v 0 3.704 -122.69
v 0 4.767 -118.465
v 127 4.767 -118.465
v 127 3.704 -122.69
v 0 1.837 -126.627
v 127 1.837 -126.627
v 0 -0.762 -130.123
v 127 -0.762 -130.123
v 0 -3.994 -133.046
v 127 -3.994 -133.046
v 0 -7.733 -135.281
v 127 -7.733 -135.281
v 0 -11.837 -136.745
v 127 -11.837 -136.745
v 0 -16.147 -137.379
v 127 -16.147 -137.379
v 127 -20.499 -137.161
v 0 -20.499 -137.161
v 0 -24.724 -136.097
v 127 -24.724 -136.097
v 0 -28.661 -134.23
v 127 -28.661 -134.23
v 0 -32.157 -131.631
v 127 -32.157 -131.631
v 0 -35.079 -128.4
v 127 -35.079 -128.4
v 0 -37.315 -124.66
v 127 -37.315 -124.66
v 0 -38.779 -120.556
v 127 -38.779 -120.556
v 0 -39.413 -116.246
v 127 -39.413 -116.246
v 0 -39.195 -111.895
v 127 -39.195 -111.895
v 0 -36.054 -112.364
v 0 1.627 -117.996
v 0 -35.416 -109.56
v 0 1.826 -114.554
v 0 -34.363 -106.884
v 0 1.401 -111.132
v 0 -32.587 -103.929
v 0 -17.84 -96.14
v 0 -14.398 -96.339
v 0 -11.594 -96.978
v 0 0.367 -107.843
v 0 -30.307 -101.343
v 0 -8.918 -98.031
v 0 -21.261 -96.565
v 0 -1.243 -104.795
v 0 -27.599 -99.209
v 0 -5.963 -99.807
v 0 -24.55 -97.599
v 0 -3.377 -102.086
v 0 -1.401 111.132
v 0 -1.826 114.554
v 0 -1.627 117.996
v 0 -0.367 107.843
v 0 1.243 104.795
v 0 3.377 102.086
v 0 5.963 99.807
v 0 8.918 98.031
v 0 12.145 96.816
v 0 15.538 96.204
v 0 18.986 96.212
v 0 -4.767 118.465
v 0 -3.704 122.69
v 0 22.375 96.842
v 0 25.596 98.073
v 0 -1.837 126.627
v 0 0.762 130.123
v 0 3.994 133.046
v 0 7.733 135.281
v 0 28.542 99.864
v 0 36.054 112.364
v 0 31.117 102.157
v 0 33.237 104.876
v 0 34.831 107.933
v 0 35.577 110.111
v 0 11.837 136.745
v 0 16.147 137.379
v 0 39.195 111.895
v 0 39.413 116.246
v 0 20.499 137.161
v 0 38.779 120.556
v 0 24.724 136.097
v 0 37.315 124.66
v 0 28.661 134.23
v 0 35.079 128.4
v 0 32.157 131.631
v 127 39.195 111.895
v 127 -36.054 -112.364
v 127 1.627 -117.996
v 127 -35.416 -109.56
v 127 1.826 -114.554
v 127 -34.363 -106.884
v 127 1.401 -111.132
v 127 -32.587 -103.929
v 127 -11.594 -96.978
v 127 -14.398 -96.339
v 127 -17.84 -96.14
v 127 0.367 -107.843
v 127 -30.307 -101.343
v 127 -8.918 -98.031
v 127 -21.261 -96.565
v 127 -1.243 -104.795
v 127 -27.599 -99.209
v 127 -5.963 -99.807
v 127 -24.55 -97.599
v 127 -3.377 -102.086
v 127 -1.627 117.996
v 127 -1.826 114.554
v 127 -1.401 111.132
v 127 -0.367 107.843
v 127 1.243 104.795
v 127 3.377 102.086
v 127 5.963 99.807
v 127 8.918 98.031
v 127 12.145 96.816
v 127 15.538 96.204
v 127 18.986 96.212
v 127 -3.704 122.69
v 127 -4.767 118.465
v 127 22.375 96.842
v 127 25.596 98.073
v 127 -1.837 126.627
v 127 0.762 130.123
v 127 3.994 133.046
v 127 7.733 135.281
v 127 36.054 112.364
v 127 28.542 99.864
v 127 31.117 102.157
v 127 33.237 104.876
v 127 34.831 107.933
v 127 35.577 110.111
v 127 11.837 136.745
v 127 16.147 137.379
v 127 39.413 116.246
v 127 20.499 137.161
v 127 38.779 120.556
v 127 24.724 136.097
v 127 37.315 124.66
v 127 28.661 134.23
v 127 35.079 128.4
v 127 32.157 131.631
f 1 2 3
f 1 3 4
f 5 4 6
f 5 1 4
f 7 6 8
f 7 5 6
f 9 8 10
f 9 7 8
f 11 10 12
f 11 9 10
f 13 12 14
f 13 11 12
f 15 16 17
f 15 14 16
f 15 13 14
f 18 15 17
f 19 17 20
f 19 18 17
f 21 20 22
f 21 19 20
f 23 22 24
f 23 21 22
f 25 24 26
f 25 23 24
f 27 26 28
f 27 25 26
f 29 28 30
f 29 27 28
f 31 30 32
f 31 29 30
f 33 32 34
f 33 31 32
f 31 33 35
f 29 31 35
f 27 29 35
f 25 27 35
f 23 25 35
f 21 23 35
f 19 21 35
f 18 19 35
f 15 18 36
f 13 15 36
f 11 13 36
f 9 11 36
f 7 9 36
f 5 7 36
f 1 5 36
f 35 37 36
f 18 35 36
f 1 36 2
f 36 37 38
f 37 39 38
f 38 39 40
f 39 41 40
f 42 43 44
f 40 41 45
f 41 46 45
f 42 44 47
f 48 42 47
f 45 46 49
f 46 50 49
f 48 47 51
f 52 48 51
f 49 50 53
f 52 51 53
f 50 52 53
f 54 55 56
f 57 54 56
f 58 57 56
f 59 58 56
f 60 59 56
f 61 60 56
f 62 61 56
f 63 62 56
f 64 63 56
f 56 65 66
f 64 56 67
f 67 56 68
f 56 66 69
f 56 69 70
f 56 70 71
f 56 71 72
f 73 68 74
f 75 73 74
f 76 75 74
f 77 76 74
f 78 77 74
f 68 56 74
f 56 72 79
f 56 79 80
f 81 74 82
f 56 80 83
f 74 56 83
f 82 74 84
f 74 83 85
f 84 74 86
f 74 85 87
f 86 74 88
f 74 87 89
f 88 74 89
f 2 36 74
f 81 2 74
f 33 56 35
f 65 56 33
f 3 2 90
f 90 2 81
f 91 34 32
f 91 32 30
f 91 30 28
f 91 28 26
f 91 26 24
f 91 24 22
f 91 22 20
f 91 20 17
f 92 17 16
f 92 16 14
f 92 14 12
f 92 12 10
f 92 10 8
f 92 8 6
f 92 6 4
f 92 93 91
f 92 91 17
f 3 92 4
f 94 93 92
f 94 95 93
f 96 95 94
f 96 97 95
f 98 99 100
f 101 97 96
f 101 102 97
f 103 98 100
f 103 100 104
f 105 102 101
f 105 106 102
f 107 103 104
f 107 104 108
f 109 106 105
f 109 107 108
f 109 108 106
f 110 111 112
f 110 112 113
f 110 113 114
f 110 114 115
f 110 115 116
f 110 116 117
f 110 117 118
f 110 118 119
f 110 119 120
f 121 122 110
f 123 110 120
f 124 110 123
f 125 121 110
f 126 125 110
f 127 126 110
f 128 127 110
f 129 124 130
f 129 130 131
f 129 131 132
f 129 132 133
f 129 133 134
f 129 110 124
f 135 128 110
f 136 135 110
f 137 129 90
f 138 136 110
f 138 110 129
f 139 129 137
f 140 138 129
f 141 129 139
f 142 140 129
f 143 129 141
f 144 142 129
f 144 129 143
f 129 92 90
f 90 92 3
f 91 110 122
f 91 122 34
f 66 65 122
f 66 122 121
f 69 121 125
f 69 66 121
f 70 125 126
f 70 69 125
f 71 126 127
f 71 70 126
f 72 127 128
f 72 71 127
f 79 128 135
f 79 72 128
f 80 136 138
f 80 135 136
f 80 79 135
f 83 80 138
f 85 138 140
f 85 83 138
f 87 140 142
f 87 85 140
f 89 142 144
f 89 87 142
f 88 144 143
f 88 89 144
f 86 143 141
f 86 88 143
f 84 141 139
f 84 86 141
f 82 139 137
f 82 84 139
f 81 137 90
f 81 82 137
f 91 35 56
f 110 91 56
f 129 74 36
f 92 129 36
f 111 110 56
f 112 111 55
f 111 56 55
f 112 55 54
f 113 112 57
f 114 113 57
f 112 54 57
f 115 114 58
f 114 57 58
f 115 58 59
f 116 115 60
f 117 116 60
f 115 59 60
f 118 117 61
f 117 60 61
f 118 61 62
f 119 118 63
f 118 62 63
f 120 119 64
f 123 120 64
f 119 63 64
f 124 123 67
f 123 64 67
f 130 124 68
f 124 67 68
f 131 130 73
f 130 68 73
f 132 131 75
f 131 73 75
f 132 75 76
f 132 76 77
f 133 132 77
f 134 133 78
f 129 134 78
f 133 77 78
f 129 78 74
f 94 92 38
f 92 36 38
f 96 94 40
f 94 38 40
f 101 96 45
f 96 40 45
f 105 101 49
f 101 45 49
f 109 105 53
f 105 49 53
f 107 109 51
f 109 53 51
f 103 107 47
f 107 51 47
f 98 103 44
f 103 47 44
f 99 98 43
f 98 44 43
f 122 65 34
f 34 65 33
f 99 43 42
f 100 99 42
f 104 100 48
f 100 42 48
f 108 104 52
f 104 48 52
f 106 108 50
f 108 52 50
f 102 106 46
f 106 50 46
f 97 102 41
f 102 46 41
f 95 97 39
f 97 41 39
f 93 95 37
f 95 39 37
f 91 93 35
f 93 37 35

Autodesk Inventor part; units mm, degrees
ref_plane "YZ Plane" through (0, 0, 0) normal (1, 0, 0) x (0, 1, 0)
ref_plane "XZ Plane" through (0, 0, 0) normal (0, 1, 0) x (-1, 0, 0)
ref_plane "XY Plane" through (0, 0, 0) normal (0, 0, 1) x (1, 0, 0)
sketch "Sketch3" plane through (0, 0, 0) normal (1, 0, 0) x (0, 1, 0)
  line L0 (17.2137, 115.1798) -> (-17.2137, -115.1798) construction
  line L1 (-4.7671, 118.4649) -> (-39.1946, -111.8947)
  line L2 (4.7671, -118.4649) -> (39.1946, 111.8947)
  arc A0 (39.1946, 111.8947) -> (-4.7671, 118.4649) centre (17.2137, 115.1798) ccw
  arc A1 (-39.1946, -111.8947) -> (4.7671, -118.4649) centre (-17.2137, -115.1798) ccw
  line L3 (0, 0) -> (232.918, 0) construction
  line L4 (36.0545, 112.364) -> (1.627, -117.9956)
  arc A2 (-36.0545, -112.364) -> (1.627, -117.9956) centre (-17.2137, -115.1798) ccw
  line L5 (-36.0545, -112.364) -> (-1.627, 117.9956)
  arc A3 (36.0545, 112.364) -> (-1.627, 117.9956) centre (17.2137, 115.1798) ccw
  ellipse E0 centre (17.2137, 115.1798) end of major axis (36.0545, 112.364) minor radius 19.05
  ellipse E1 centre (-17.2137, -115.1798) end of major axis (1.627, -117.9956) minor radius 19.05
  point P0 (-36.0545, -112.364)
  dimension "d8" = 116.459
  dimension "d9" = 98.5
  dimension "d10" = 44.45
  dimension "d11" = 3.175
extrude "Extrusion3" add sketch "Sketch3" along normal blind 127 contours A0 L2 A1 L1 | E0 A3 | A2 E1
properties part number "ShootingMech_Housing4"
